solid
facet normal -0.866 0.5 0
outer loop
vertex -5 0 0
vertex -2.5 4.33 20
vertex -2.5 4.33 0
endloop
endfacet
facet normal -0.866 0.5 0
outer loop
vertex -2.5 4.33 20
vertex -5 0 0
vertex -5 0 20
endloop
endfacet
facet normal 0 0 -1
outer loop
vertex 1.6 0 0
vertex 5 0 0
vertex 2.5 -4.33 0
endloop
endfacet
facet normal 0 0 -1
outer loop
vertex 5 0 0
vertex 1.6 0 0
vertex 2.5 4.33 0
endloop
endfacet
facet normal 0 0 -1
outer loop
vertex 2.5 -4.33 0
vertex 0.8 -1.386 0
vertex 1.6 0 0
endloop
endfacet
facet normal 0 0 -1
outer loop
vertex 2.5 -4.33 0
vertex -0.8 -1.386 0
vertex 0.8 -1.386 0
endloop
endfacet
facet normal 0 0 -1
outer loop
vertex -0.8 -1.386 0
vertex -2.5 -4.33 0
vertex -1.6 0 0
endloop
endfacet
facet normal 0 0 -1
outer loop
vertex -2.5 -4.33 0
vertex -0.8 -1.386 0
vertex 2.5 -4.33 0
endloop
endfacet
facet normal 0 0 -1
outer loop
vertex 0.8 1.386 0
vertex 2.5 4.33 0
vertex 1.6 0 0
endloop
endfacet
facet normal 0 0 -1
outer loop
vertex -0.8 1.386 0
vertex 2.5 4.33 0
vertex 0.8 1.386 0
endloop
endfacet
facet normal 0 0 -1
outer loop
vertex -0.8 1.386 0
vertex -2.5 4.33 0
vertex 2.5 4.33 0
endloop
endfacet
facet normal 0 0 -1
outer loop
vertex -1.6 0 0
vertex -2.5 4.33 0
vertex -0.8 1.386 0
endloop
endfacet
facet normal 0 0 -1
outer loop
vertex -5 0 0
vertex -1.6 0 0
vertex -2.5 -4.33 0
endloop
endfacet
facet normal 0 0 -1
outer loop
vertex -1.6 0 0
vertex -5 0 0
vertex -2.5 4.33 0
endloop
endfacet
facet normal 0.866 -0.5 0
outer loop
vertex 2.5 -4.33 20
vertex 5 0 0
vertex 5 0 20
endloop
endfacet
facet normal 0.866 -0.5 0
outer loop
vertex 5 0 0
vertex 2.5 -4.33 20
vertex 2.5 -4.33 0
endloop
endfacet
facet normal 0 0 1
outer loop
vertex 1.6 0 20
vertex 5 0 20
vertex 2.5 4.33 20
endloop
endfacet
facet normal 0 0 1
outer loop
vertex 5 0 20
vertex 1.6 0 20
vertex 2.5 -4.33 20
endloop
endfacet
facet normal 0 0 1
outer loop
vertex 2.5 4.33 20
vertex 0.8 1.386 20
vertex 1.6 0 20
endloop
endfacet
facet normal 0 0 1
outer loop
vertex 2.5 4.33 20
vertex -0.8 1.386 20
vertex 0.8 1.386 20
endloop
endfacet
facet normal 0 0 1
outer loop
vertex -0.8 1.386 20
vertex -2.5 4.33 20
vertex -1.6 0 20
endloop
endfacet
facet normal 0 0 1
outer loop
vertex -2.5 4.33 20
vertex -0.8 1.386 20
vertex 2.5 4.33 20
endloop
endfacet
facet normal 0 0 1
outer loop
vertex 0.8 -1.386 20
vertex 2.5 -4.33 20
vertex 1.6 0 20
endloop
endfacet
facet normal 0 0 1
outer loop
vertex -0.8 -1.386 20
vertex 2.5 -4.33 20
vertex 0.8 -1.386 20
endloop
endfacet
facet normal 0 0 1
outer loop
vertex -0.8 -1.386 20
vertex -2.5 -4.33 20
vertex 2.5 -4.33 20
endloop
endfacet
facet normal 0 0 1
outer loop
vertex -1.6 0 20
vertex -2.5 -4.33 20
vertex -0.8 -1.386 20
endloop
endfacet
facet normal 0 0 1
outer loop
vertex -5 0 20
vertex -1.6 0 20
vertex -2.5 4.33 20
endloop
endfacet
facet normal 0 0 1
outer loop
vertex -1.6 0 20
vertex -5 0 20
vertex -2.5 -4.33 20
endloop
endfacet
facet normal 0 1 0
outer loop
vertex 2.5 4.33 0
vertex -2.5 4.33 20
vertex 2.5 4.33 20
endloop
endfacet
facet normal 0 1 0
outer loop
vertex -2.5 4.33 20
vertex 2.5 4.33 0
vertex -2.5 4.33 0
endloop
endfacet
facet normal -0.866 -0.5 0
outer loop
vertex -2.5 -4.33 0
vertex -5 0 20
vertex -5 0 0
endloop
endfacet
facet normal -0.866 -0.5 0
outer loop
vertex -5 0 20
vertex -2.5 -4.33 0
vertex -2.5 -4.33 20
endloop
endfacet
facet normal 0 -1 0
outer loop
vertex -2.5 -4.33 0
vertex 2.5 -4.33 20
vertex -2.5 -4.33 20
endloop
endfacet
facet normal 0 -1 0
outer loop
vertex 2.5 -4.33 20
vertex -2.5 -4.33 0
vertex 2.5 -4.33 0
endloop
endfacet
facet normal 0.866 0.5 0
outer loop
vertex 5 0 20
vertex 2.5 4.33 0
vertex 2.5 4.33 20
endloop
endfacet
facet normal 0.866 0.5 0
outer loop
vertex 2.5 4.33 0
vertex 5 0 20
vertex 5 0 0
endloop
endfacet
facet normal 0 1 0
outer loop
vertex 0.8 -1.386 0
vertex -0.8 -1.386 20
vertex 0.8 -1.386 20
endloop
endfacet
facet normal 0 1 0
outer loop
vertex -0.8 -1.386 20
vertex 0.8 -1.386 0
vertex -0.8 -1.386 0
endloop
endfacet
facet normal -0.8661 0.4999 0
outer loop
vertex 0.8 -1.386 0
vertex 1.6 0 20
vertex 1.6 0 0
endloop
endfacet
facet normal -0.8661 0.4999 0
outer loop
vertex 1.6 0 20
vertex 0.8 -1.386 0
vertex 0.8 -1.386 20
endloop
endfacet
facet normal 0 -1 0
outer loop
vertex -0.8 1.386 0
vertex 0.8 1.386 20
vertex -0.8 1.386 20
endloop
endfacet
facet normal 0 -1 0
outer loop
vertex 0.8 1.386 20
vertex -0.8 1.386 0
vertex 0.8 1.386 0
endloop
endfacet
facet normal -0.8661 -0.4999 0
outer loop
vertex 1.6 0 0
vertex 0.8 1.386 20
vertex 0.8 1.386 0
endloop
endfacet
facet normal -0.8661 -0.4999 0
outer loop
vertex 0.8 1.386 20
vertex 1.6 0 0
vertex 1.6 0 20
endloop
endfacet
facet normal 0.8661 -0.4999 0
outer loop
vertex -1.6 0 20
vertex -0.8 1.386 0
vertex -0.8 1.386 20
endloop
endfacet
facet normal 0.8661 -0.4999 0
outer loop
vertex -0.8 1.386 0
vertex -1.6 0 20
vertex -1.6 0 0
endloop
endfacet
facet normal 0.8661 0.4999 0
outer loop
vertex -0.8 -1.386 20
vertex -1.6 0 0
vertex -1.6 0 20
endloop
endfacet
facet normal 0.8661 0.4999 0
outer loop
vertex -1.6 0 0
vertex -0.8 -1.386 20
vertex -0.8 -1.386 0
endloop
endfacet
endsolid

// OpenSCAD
// M3 hex standoff. Showcases: circle($fn=6) as an EXACT hexagon (6 planar faces,
// not a faceted curve) + a cylindrical bore -> a clean, exact STEP spacer.
difference() {
  linear_extrude(20) circle(r = 5, $fn = 6);       // hex body, 10mm across corners
  translate([0, 0, -1]) cylinder(h = 22, r = 1.6); // M3 clearance bore
}
